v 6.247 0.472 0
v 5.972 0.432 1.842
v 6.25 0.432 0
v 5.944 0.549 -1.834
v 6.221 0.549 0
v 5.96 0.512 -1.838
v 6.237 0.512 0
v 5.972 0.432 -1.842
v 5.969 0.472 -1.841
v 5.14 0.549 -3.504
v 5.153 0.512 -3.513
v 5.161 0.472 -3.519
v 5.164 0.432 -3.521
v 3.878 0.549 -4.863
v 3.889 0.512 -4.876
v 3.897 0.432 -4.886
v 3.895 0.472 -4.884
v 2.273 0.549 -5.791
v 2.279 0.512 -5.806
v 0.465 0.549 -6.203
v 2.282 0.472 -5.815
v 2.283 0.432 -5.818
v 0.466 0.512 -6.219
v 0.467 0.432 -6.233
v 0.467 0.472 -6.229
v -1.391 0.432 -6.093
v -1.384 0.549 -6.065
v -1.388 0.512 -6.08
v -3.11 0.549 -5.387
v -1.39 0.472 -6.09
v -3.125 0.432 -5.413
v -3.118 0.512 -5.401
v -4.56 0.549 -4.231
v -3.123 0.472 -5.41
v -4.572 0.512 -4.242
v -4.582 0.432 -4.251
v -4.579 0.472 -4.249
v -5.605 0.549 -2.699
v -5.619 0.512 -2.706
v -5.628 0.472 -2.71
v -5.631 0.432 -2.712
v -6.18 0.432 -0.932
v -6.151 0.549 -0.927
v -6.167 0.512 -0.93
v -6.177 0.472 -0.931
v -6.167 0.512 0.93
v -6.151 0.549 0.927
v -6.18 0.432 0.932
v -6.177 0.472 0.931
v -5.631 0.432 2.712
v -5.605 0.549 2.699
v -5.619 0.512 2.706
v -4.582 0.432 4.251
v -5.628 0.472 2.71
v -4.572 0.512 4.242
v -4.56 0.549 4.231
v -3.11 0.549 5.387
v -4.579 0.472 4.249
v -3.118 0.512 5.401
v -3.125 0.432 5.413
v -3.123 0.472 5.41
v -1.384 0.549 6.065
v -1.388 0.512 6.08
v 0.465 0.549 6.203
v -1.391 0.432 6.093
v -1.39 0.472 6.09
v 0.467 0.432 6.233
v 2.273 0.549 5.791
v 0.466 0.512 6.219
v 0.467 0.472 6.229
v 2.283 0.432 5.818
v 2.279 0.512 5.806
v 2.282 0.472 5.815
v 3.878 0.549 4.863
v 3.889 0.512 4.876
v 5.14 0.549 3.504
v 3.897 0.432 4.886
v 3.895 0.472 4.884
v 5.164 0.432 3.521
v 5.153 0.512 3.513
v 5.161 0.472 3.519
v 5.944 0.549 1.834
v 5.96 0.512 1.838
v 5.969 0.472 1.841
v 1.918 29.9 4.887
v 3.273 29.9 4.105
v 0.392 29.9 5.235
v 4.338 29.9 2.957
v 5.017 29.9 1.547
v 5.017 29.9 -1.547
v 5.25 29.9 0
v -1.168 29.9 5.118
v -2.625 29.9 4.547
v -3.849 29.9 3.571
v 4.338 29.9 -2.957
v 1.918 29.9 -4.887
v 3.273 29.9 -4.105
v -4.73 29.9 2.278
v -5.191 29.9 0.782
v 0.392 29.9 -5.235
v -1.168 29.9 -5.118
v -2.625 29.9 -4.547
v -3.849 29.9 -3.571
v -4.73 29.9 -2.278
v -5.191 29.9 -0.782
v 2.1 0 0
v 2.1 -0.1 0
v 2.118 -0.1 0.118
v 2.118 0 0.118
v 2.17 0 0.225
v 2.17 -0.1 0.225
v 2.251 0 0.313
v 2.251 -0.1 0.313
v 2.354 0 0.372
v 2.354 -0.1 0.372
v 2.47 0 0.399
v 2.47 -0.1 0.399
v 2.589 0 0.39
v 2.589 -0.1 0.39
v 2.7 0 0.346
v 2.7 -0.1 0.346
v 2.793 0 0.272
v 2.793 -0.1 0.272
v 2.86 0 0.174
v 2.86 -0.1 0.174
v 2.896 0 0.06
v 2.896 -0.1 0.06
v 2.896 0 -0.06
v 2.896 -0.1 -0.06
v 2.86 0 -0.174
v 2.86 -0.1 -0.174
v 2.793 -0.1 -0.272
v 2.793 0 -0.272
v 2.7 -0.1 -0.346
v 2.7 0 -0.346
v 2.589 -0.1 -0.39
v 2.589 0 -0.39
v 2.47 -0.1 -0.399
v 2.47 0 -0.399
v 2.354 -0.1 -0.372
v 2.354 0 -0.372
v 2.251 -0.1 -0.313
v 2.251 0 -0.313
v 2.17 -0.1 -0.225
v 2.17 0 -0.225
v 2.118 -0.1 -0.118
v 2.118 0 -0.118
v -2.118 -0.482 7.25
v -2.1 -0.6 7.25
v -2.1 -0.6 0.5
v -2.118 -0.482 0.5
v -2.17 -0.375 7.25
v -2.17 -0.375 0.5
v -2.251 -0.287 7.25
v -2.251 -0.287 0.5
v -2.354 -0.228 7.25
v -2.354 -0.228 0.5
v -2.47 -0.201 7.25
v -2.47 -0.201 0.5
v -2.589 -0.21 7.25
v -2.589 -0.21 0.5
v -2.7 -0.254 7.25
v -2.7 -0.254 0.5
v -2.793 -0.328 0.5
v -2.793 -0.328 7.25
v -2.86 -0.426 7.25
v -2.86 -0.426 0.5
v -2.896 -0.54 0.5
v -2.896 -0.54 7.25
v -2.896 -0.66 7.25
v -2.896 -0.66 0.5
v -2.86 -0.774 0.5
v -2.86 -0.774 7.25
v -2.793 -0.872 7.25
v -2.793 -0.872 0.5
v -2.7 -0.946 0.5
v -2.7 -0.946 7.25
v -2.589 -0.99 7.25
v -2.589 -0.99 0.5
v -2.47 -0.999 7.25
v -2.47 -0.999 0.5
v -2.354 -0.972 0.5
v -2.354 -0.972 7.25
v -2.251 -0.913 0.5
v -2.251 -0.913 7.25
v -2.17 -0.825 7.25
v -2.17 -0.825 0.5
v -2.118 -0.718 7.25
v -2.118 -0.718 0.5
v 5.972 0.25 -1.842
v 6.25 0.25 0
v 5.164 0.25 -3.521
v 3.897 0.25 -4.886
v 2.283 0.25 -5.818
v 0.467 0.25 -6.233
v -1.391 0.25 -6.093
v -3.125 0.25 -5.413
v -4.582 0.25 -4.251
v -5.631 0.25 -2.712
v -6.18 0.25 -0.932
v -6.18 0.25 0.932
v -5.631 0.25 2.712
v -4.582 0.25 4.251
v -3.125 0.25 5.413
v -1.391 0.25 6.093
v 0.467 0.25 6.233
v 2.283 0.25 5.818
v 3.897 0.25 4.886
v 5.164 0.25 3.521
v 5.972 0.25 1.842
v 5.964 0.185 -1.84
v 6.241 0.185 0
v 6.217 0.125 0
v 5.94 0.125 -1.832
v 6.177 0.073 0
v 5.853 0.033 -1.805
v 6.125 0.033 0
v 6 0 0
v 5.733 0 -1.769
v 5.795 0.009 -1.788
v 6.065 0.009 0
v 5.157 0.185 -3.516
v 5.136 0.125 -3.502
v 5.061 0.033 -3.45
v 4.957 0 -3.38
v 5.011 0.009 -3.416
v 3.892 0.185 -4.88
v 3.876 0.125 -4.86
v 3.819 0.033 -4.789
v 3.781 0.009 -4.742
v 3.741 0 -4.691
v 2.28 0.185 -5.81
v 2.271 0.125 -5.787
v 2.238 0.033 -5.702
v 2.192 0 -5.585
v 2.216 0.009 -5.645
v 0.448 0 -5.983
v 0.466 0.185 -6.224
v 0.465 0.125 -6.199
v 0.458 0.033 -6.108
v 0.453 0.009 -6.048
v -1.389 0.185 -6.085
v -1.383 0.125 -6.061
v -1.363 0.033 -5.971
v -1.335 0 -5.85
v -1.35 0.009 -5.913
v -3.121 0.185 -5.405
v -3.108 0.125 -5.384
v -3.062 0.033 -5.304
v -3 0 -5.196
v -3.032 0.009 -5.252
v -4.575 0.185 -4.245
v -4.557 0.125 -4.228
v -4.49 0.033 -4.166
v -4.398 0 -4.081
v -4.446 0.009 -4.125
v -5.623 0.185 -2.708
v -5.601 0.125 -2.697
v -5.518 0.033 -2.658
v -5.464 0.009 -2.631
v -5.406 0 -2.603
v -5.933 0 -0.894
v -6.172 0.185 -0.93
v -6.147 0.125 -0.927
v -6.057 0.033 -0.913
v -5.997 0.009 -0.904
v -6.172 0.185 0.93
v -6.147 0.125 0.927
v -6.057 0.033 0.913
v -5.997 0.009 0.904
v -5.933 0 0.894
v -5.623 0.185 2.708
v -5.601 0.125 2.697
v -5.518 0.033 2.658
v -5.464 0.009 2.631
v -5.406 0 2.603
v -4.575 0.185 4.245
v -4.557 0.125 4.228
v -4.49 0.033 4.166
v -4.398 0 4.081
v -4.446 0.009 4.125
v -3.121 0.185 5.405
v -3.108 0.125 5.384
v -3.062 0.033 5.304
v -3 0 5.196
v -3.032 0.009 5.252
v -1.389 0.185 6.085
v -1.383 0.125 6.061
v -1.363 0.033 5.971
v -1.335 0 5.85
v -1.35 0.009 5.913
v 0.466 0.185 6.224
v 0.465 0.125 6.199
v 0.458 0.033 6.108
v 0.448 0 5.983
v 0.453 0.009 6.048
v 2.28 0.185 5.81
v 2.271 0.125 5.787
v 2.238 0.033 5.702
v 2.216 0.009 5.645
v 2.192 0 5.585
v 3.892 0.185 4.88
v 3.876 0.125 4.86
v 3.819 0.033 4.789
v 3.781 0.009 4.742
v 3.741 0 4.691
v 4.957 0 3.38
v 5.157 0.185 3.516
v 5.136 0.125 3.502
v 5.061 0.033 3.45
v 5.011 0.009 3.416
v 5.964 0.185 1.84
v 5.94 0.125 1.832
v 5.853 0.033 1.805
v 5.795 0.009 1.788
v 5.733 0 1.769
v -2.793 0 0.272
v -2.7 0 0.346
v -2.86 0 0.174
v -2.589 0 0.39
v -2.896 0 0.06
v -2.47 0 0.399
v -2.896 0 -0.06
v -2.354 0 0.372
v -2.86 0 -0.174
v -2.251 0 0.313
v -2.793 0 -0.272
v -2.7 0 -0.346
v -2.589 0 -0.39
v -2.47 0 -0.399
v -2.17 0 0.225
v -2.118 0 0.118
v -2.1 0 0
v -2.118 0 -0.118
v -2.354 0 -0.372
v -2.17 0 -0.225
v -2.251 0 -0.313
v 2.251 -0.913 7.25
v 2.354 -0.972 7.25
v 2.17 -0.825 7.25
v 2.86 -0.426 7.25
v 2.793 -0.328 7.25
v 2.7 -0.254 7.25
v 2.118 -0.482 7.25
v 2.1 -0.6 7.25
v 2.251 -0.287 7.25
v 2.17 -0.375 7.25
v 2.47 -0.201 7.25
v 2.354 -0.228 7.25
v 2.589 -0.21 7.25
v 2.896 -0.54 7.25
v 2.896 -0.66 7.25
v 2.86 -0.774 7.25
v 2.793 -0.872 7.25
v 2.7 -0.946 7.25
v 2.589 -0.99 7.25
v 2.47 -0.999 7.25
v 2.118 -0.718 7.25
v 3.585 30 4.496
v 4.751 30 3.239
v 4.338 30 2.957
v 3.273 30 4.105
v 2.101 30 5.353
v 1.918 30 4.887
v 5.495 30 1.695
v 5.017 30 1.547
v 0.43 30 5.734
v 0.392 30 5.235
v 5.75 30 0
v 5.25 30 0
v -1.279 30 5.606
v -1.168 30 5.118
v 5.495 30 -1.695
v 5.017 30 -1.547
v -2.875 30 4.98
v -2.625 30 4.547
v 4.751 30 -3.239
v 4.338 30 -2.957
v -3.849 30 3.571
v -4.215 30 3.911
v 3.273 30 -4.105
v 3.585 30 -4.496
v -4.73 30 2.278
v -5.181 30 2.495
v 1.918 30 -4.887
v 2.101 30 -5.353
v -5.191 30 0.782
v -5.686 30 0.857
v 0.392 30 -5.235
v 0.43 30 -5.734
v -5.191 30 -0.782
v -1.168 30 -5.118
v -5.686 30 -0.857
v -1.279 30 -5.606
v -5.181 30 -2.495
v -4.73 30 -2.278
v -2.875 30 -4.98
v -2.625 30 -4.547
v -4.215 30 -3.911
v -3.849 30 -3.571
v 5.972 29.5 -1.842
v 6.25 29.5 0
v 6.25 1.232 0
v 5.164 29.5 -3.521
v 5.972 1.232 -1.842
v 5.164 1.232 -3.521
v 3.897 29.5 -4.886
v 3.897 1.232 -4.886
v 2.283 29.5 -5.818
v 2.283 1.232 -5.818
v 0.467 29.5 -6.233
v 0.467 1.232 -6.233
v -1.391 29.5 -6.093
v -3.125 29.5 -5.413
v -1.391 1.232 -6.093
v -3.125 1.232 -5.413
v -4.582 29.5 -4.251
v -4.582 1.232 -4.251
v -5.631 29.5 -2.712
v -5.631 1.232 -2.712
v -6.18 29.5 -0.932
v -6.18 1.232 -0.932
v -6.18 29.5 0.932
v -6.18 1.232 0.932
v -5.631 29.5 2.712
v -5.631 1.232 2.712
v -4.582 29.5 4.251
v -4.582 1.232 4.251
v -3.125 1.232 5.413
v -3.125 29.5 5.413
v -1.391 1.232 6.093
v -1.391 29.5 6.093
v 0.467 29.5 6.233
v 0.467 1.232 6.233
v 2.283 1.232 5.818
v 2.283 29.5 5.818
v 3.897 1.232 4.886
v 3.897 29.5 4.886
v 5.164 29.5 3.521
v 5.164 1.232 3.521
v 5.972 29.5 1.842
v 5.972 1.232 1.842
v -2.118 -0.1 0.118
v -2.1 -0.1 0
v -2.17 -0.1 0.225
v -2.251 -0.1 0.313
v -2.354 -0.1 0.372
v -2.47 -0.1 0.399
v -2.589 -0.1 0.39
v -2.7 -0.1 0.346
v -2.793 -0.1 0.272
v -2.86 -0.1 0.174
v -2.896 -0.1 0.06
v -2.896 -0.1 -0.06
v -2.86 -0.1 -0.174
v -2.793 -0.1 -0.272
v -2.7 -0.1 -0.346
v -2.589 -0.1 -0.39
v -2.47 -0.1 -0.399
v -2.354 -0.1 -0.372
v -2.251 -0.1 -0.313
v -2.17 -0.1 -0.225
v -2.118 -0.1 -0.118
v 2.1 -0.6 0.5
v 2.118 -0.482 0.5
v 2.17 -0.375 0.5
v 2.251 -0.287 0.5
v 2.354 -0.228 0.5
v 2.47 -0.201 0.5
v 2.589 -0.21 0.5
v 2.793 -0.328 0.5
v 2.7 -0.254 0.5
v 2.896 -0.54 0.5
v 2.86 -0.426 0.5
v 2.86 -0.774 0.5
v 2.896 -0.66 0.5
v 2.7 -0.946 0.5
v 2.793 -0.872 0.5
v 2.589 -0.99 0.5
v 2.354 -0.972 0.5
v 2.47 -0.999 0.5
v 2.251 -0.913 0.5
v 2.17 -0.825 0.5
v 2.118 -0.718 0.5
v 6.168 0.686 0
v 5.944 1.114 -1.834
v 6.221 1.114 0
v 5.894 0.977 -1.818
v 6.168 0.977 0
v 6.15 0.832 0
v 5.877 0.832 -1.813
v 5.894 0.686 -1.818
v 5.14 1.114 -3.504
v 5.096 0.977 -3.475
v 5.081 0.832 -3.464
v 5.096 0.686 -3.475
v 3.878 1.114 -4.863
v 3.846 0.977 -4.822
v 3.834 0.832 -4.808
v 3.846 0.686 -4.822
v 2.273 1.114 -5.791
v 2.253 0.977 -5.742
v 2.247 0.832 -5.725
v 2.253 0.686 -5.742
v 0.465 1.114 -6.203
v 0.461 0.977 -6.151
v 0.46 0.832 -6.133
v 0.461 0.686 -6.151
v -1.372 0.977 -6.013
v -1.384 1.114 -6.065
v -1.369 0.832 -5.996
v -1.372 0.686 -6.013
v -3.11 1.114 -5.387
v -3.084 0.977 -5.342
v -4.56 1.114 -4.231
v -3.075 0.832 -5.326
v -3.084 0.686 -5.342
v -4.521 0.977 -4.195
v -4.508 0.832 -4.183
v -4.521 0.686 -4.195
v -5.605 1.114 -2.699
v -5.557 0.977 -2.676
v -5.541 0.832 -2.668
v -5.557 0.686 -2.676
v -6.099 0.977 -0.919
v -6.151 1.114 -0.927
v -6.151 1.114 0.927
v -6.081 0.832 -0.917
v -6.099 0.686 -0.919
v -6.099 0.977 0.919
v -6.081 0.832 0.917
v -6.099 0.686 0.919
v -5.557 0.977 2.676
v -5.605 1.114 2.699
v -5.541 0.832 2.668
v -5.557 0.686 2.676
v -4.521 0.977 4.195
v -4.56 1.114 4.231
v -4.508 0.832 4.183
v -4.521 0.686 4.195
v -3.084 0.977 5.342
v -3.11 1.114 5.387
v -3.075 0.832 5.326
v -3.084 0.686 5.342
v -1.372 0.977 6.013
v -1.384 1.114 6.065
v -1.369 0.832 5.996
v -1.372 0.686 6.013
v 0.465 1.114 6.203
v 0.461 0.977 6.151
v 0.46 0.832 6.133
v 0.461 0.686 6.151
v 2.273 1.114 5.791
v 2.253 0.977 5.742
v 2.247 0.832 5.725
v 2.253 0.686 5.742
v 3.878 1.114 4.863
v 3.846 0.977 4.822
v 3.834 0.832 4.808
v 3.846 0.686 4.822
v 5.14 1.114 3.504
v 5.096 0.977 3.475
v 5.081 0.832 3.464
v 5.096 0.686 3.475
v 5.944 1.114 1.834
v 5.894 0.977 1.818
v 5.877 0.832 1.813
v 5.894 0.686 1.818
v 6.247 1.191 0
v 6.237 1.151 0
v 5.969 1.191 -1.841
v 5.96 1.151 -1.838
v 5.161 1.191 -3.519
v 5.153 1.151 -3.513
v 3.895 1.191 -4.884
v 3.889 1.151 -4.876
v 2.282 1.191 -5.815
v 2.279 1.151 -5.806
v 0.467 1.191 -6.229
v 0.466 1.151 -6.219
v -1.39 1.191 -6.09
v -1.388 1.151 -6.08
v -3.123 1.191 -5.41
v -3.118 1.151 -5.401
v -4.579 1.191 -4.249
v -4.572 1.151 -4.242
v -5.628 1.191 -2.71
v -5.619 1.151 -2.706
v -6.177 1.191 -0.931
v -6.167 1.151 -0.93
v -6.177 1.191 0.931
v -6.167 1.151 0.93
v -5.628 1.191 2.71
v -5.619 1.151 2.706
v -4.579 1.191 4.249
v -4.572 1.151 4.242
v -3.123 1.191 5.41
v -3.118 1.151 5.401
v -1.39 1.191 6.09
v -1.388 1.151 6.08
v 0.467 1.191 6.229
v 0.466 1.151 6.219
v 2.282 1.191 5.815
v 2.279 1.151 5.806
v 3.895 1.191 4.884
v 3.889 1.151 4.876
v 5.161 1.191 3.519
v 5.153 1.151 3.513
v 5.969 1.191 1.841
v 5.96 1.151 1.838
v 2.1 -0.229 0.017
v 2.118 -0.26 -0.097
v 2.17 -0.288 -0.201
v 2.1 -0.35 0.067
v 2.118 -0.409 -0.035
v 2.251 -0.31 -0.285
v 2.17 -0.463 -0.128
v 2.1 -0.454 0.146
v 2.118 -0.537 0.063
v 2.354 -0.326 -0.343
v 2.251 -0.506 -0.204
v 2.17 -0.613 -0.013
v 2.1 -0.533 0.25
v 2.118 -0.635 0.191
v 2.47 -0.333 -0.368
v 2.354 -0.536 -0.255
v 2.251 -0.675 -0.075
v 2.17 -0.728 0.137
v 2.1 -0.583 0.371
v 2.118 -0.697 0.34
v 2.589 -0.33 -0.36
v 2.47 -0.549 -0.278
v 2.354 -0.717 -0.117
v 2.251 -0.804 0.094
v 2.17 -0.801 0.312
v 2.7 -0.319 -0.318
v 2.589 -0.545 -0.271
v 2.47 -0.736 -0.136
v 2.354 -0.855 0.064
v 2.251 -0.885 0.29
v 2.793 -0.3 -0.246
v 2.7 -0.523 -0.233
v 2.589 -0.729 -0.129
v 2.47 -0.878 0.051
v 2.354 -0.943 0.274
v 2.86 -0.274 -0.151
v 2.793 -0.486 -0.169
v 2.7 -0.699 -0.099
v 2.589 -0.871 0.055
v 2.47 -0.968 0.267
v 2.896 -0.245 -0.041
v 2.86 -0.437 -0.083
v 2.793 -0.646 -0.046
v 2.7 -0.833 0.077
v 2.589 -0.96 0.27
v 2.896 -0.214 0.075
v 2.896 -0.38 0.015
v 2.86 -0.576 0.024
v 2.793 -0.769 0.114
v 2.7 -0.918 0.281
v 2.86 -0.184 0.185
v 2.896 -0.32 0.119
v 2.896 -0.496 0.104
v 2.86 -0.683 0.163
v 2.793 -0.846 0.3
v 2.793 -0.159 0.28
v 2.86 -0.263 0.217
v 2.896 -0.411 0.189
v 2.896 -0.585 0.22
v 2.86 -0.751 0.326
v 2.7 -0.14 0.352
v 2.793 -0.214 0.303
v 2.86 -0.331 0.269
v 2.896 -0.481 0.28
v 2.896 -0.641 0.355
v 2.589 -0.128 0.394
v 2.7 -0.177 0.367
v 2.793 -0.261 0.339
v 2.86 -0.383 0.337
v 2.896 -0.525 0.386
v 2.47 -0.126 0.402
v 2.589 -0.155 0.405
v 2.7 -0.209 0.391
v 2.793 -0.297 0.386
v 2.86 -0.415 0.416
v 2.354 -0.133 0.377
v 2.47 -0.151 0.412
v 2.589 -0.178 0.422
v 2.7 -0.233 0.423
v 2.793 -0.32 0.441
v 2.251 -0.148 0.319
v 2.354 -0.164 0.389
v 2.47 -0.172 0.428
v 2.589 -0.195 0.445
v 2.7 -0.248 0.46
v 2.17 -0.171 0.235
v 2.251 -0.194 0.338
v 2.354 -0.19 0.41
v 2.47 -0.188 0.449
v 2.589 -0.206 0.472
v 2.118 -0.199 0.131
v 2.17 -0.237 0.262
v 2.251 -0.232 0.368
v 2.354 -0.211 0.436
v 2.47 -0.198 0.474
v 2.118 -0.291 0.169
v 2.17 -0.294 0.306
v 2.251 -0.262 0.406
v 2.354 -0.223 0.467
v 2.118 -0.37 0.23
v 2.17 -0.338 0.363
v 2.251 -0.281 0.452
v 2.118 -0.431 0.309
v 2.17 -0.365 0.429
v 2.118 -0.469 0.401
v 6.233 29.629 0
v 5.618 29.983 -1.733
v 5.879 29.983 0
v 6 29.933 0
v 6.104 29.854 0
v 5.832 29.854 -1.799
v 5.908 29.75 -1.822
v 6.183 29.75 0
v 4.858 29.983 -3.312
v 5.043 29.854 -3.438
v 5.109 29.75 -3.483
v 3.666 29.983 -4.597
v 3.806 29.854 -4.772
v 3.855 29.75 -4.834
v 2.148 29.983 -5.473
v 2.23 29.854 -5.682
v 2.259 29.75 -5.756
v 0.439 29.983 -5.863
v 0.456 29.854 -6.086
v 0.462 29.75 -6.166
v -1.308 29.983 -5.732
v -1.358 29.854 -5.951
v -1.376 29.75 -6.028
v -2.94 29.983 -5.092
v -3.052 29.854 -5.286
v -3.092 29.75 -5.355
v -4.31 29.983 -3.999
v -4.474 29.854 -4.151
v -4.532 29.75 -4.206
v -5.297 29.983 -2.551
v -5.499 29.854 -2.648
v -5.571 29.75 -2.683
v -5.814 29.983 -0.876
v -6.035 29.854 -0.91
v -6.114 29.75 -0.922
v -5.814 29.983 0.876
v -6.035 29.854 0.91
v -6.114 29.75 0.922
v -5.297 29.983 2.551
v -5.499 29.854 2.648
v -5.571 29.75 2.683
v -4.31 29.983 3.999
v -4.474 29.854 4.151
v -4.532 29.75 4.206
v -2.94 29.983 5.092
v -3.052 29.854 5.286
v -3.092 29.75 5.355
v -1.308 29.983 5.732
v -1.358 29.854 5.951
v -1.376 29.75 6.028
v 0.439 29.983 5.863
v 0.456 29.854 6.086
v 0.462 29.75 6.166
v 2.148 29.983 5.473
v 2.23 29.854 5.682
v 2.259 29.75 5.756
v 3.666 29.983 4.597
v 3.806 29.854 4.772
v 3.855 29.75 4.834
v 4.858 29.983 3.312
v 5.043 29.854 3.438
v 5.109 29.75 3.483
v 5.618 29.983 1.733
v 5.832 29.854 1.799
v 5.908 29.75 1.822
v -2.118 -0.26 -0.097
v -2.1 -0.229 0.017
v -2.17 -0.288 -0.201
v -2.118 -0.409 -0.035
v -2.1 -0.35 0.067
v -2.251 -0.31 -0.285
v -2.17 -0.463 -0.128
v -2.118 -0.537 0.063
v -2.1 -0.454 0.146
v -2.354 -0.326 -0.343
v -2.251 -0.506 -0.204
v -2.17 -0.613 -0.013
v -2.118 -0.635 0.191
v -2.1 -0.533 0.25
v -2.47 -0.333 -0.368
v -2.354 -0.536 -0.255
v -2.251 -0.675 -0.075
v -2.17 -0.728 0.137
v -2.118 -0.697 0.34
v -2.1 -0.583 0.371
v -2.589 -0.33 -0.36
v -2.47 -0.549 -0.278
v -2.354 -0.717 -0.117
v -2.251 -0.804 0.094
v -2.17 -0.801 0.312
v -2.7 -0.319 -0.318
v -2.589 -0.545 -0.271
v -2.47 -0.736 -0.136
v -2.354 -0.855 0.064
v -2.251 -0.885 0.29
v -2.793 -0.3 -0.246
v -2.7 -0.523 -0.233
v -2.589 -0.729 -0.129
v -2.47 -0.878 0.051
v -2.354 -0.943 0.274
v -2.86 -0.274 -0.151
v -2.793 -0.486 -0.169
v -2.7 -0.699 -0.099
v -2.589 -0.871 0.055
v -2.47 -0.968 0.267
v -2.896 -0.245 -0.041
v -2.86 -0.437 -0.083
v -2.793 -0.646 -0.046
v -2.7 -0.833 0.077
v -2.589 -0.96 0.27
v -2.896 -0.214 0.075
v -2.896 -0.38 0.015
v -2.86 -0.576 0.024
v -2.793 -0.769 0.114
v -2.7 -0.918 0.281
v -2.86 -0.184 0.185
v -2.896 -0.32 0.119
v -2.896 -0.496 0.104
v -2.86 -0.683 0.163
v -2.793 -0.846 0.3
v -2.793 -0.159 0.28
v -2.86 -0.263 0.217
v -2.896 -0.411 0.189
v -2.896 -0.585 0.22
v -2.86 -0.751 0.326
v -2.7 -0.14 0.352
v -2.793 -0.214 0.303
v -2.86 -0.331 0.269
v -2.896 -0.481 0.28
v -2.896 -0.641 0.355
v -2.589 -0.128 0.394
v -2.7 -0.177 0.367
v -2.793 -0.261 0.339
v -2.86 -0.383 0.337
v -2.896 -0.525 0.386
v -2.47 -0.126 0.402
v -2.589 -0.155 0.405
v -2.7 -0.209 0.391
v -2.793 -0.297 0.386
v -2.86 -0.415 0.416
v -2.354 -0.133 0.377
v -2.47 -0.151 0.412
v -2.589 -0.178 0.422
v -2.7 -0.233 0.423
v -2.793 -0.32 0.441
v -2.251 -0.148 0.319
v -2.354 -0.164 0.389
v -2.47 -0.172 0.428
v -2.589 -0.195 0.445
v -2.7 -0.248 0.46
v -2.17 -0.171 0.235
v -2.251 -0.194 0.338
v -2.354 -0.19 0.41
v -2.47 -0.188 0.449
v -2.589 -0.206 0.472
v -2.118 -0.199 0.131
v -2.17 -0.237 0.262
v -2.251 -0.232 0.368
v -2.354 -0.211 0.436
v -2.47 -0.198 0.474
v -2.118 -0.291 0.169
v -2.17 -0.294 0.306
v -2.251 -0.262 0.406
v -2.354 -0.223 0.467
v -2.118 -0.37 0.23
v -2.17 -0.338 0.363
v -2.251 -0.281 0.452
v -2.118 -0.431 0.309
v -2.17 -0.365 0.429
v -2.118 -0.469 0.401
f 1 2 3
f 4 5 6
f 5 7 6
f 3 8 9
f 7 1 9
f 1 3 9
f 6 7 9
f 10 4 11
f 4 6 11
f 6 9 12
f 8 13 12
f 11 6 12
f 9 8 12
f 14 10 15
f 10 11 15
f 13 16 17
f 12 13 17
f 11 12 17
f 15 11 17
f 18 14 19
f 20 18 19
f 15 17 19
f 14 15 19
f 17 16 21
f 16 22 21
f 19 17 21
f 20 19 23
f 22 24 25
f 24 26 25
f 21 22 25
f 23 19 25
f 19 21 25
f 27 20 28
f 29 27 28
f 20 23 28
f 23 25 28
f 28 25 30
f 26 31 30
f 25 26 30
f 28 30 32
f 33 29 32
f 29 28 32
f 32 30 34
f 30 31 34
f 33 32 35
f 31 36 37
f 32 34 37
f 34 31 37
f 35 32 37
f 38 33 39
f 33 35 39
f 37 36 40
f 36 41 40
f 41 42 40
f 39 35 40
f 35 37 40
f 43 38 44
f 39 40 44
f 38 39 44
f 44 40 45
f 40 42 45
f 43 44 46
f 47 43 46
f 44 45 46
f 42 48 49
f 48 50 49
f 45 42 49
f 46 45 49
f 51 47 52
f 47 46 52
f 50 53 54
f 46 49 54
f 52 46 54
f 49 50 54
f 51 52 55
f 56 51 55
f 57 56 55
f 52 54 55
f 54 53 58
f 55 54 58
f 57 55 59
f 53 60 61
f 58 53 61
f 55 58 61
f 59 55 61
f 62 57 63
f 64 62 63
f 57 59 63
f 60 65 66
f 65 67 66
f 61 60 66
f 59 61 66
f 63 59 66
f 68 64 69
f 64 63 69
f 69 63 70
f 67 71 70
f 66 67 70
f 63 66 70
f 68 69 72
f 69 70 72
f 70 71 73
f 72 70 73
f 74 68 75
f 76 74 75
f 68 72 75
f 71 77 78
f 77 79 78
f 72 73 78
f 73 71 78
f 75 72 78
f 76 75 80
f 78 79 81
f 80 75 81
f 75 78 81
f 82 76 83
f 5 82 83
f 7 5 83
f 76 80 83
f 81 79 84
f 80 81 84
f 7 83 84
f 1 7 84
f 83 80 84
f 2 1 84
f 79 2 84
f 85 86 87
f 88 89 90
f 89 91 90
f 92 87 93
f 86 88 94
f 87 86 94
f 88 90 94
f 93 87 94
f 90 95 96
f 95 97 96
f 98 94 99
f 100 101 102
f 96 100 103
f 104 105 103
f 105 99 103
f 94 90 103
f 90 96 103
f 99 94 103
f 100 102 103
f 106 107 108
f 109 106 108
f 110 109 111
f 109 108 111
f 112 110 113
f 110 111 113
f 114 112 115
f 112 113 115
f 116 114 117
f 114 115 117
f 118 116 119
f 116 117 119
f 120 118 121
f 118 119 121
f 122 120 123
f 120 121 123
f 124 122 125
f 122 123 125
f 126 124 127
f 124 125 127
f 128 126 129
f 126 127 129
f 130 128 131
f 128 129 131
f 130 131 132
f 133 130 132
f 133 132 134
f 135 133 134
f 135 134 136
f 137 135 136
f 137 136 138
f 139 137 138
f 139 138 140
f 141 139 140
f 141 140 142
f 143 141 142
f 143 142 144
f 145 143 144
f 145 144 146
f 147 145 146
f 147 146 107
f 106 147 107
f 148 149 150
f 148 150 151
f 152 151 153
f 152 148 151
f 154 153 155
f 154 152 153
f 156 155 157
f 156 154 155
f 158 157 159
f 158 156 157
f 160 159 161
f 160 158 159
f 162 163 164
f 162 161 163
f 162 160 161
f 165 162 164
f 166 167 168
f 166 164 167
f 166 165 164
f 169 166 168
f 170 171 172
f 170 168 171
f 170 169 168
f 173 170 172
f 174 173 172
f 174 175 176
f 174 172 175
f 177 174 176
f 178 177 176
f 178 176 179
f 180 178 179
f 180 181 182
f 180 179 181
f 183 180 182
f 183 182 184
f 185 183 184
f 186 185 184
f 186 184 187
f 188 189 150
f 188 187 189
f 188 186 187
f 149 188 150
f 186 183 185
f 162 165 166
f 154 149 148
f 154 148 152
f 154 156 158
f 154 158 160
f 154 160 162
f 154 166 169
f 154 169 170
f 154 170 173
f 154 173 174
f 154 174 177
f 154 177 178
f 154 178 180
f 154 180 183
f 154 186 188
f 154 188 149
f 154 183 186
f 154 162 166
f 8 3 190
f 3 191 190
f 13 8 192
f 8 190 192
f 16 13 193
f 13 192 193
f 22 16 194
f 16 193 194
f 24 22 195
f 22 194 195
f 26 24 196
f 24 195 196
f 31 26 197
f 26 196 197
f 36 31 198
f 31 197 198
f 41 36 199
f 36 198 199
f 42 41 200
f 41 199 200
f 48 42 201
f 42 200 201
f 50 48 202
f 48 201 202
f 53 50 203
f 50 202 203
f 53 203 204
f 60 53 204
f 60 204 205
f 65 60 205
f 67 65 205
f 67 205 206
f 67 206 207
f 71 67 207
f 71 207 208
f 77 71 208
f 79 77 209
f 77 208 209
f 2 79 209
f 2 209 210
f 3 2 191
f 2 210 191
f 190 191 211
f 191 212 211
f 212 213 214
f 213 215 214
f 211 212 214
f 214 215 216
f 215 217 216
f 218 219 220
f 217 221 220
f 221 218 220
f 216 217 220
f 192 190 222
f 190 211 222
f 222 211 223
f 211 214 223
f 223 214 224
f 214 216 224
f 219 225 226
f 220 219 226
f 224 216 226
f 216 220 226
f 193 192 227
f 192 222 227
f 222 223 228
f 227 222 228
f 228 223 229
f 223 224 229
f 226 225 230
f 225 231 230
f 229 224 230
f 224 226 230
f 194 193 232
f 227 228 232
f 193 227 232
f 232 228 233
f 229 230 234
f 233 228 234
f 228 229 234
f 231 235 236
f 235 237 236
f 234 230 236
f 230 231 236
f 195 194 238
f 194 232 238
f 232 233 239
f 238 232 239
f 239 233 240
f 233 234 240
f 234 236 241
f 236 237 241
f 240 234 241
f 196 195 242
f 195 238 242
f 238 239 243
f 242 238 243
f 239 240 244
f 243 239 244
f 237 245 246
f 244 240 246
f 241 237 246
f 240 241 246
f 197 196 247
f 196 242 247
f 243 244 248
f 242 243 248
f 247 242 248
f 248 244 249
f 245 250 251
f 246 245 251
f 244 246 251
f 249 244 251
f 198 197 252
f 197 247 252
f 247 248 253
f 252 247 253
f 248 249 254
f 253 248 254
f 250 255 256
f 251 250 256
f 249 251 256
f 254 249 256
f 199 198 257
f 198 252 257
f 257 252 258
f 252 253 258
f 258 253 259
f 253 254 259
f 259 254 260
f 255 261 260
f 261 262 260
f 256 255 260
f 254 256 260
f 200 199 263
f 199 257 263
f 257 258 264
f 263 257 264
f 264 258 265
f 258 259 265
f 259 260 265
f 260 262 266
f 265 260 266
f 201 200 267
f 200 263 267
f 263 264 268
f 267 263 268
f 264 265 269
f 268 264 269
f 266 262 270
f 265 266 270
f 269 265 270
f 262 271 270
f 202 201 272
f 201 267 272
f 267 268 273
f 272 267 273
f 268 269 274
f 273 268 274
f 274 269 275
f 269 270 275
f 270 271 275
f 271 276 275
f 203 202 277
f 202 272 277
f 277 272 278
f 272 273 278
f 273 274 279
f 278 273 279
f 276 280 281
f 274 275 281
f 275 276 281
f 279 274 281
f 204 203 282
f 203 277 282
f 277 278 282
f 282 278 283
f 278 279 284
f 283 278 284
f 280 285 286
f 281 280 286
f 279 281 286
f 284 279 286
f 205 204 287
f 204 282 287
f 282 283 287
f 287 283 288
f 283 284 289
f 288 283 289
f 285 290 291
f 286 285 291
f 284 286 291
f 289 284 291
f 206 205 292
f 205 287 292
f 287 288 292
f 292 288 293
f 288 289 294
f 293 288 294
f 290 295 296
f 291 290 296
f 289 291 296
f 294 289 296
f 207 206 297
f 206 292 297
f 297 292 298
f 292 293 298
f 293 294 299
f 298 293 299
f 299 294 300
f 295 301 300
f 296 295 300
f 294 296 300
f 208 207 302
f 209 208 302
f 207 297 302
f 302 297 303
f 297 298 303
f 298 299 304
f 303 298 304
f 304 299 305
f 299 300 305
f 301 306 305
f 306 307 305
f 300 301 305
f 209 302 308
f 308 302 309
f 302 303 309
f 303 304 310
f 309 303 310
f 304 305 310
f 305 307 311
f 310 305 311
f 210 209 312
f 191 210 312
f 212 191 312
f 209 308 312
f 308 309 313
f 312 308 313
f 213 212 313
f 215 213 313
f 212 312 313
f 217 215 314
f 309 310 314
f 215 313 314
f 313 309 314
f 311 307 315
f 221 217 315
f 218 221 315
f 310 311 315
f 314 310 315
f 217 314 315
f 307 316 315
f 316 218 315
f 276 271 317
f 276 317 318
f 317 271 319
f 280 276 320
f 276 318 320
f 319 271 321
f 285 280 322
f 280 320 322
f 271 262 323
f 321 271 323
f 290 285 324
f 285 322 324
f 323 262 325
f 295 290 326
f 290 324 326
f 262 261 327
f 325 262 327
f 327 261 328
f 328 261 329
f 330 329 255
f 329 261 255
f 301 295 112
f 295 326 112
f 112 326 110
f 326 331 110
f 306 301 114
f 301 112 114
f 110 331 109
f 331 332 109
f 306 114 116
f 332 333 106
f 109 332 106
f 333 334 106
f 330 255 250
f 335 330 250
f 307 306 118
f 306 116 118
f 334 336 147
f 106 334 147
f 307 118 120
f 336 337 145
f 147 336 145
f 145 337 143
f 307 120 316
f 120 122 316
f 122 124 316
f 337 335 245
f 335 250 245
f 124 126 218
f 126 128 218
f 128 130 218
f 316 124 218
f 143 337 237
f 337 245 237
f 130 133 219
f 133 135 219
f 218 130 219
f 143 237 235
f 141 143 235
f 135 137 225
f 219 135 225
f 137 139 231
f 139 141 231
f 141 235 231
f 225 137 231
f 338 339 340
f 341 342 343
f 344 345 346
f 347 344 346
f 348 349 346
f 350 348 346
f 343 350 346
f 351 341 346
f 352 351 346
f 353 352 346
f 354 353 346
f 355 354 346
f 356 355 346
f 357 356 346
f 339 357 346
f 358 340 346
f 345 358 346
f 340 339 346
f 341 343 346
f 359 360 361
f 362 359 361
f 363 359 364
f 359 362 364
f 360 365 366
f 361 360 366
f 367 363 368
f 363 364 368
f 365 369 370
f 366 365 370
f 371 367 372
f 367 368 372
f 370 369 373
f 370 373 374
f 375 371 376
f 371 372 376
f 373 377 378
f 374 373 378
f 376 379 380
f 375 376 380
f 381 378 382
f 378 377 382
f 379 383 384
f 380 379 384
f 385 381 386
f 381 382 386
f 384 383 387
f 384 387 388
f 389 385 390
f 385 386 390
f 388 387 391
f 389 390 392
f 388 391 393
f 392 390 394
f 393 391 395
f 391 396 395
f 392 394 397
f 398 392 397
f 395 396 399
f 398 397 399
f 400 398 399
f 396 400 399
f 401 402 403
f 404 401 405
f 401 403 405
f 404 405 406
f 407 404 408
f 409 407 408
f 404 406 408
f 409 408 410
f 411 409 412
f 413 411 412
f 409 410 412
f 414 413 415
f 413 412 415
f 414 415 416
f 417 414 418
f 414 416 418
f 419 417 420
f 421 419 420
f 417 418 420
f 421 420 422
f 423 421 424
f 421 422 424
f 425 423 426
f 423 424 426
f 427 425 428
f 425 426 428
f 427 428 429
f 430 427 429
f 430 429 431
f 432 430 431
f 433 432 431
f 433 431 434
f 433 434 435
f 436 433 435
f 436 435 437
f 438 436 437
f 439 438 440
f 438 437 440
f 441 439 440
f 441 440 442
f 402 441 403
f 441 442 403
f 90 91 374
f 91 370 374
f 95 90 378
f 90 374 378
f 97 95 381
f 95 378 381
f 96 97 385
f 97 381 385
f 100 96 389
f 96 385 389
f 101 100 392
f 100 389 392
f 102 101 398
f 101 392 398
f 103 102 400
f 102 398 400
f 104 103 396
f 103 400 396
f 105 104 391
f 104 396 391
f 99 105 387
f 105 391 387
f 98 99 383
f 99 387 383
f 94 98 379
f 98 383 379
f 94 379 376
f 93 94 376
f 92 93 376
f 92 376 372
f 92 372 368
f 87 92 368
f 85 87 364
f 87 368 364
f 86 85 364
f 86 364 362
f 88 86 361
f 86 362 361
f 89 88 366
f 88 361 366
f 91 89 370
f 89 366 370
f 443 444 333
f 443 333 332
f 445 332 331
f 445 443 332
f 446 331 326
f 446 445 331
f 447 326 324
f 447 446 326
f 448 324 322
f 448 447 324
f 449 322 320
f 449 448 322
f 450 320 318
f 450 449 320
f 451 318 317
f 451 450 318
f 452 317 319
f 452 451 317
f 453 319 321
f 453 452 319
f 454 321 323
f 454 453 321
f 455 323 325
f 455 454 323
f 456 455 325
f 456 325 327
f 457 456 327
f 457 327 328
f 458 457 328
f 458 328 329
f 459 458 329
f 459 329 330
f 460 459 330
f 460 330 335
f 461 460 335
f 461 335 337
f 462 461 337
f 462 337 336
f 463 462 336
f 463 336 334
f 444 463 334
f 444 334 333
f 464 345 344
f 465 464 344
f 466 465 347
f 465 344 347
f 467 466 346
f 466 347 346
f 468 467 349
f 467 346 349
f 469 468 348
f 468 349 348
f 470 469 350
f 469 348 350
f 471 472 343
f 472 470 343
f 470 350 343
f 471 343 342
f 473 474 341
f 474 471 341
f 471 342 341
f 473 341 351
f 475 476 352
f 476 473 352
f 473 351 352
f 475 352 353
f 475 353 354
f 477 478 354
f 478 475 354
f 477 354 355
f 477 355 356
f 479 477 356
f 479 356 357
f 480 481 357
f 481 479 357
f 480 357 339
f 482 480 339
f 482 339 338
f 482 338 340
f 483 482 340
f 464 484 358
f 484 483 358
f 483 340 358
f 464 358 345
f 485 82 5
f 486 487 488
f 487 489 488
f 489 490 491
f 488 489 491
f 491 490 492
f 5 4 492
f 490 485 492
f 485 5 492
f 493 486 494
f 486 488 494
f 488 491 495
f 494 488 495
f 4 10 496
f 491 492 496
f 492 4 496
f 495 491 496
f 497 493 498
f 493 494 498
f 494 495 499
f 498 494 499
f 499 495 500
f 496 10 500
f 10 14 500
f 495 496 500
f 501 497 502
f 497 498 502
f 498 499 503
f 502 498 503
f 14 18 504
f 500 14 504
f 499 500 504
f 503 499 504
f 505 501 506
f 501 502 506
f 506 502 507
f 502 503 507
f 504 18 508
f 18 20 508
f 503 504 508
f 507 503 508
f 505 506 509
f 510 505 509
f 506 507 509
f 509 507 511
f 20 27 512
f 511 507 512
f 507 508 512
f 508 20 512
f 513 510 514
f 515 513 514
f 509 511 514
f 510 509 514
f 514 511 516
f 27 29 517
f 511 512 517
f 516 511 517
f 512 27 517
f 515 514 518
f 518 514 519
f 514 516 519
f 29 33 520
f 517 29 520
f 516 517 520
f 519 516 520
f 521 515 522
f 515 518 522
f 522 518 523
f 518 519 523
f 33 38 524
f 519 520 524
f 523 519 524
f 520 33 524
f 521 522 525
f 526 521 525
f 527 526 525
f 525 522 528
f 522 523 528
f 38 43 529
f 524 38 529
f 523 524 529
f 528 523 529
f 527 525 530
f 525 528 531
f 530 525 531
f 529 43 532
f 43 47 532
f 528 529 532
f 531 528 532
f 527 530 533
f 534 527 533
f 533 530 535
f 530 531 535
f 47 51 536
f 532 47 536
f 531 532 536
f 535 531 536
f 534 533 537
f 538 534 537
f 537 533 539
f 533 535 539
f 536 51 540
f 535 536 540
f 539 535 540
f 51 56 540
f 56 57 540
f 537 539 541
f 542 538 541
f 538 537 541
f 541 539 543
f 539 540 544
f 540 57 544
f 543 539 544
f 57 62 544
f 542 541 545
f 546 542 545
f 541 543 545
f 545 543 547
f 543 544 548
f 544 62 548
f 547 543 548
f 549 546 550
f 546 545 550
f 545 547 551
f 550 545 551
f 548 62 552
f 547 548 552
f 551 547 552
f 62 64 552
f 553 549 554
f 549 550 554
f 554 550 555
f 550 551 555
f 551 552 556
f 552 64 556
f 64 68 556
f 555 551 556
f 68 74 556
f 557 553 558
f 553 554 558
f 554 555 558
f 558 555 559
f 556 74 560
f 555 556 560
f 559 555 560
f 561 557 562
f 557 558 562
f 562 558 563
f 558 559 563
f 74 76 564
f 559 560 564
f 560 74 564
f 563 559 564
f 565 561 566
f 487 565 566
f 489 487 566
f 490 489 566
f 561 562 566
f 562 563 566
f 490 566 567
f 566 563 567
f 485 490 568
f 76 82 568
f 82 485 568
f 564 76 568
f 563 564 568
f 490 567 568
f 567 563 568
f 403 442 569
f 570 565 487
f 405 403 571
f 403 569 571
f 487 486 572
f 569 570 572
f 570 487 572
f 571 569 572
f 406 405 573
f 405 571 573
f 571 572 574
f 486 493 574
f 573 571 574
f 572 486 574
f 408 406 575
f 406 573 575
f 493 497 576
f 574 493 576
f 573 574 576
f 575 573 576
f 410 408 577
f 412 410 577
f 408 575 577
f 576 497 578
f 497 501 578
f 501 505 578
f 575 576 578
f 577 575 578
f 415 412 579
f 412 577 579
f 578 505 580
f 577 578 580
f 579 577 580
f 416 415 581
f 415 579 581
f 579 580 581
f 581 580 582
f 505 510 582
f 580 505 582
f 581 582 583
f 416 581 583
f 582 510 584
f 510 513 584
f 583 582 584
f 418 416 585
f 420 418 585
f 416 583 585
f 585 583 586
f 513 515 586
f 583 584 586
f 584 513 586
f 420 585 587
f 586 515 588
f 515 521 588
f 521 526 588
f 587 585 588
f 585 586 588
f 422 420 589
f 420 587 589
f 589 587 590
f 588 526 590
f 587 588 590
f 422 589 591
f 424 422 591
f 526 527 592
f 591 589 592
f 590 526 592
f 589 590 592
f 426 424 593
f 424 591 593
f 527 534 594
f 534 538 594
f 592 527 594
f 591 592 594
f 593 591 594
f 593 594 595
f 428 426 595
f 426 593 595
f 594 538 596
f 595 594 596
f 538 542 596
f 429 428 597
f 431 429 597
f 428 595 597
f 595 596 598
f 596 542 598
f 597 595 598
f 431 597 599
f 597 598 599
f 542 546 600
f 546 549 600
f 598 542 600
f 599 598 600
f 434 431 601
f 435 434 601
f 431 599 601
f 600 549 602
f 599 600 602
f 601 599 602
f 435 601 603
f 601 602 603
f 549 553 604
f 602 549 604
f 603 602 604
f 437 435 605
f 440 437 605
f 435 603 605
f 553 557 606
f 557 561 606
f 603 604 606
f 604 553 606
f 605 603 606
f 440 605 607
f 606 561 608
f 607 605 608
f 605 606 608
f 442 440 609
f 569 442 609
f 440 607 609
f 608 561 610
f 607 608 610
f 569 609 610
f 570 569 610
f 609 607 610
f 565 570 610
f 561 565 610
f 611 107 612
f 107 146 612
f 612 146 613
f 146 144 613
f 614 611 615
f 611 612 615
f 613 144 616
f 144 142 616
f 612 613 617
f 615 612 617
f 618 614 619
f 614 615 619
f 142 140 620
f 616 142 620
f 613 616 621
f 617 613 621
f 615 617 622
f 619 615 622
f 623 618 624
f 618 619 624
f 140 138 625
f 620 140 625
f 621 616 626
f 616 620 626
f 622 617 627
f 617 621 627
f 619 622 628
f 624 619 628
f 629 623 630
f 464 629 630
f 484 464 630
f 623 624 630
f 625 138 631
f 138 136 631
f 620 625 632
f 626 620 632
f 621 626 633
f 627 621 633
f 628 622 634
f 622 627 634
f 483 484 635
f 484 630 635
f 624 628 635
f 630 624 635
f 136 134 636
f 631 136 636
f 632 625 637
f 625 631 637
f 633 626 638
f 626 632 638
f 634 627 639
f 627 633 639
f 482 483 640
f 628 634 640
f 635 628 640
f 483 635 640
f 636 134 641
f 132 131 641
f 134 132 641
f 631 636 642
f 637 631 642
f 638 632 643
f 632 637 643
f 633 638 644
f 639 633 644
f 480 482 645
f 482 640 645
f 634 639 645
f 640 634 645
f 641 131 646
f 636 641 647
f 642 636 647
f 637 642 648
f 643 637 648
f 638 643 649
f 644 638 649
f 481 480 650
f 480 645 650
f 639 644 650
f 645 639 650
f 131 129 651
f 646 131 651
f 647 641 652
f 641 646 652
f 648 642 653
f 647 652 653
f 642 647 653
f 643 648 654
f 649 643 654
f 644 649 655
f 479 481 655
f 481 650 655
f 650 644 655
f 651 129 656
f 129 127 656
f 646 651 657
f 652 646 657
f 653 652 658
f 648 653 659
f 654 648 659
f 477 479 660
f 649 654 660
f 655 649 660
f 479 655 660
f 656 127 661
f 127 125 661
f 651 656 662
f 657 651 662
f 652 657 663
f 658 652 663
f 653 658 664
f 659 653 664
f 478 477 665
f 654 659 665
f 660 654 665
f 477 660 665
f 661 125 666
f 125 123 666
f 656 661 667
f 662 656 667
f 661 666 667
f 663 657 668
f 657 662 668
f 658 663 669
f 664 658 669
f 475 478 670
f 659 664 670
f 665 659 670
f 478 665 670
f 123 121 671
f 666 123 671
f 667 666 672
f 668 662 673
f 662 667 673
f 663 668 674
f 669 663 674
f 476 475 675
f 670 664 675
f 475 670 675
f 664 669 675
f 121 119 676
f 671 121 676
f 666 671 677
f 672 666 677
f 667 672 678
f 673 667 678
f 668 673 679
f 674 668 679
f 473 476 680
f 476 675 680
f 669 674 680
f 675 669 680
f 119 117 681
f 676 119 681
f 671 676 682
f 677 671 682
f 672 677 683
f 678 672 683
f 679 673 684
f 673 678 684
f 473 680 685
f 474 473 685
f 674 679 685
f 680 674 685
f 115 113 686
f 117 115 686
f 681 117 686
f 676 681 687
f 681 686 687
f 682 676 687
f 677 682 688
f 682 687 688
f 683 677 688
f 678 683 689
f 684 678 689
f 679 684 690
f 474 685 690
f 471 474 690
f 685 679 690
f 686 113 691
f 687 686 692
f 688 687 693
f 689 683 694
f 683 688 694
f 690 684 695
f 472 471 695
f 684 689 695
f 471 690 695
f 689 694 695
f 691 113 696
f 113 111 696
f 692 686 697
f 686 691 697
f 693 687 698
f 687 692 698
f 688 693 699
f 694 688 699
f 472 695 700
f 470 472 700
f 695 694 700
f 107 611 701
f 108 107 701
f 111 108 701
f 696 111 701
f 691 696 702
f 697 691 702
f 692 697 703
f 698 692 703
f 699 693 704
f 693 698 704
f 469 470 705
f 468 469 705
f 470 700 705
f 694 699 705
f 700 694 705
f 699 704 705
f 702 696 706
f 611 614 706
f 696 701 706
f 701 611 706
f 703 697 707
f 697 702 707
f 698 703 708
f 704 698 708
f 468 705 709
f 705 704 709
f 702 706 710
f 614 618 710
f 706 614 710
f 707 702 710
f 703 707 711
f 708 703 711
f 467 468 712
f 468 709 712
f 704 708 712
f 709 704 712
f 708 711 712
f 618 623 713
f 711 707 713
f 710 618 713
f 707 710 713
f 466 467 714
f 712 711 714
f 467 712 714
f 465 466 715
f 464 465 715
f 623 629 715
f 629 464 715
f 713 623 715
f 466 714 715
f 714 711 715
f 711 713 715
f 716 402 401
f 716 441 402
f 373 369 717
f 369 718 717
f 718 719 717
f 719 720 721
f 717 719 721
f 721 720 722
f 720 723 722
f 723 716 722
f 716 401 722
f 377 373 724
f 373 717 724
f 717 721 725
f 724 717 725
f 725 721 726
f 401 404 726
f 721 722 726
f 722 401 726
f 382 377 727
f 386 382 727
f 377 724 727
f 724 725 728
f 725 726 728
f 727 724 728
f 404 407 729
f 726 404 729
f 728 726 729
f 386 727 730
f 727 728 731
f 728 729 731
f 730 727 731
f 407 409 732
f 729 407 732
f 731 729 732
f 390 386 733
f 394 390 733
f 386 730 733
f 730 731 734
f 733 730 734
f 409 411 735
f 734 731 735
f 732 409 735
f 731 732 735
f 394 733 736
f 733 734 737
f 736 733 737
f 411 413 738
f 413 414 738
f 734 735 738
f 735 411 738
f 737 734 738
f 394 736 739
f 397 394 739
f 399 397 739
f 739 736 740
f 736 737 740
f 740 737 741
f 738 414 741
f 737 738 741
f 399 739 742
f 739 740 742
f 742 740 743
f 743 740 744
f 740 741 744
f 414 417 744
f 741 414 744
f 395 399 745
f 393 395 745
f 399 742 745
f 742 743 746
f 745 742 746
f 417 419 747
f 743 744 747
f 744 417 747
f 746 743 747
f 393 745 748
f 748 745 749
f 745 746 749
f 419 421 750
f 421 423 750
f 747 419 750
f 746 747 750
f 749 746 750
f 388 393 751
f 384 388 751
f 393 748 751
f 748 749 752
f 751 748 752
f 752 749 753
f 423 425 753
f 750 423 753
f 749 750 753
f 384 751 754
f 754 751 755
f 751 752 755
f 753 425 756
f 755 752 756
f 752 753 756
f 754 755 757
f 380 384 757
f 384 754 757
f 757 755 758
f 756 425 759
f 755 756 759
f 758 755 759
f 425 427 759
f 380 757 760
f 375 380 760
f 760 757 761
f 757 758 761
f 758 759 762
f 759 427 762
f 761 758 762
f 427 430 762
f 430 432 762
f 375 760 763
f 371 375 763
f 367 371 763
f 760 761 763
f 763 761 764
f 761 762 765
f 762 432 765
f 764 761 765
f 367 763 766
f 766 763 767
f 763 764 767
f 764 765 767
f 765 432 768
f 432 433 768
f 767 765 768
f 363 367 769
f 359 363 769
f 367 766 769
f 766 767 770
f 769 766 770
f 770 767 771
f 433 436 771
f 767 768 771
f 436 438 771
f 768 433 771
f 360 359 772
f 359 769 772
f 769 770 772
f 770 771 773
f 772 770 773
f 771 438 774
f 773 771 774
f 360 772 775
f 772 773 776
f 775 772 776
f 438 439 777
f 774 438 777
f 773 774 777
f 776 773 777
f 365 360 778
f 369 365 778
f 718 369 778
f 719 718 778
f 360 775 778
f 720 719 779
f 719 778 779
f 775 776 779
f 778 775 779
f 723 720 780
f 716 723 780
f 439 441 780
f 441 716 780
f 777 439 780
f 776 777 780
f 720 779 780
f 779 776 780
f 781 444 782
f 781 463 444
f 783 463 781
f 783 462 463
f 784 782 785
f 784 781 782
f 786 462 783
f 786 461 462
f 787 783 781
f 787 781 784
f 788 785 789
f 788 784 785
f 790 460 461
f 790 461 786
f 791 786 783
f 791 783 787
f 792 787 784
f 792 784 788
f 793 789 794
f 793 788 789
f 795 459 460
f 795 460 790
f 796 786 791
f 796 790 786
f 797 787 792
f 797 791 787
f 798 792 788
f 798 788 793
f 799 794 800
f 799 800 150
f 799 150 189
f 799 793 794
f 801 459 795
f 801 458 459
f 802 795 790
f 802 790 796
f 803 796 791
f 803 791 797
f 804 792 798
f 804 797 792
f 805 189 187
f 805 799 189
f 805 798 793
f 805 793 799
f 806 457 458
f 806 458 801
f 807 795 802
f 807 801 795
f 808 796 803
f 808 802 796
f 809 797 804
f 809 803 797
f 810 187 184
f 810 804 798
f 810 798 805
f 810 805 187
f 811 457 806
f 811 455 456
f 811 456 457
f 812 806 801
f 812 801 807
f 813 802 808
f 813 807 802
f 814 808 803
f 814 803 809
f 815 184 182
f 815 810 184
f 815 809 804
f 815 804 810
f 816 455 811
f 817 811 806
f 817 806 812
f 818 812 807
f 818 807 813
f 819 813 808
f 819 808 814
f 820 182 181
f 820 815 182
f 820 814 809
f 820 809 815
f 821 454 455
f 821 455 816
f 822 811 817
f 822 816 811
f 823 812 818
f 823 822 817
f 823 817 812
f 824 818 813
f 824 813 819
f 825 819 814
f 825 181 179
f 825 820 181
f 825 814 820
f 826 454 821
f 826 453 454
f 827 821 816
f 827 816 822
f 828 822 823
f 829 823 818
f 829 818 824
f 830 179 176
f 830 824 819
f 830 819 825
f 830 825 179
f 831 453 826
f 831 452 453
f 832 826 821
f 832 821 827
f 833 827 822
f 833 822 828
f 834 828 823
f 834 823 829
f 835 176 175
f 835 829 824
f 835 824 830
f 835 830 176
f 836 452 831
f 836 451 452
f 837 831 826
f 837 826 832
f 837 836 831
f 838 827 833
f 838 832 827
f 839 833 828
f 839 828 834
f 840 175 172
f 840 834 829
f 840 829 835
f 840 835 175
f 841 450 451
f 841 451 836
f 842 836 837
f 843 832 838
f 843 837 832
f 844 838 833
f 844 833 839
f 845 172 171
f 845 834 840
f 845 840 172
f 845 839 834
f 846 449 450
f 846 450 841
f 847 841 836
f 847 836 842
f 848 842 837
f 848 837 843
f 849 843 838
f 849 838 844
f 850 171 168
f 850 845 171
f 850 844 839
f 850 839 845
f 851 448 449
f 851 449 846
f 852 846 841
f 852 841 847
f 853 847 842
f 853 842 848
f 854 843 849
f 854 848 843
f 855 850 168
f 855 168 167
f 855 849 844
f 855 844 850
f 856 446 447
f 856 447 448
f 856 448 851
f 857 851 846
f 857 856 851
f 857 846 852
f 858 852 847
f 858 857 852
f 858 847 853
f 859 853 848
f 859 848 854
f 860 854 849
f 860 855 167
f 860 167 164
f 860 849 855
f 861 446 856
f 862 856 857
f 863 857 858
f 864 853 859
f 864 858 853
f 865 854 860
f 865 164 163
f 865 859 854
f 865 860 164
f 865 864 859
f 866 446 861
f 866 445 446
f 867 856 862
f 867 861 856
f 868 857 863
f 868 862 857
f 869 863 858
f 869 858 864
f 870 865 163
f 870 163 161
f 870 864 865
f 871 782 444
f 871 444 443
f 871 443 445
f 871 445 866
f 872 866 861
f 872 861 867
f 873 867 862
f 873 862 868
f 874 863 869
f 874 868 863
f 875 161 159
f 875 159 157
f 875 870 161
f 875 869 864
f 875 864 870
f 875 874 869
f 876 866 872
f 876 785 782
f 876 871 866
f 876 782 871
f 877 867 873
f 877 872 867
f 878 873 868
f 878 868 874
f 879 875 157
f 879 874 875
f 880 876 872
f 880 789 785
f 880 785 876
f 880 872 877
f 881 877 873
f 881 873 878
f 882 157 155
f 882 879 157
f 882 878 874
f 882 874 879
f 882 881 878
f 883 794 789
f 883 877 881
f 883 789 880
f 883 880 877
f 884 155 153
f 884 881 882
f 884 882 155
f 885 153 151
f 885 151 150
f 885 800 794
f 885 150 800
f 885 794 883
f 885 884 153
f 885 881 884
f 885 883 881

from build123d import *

# Parameters (mm, degrees)
SKETCH4_R = 0.4


with BuildPart() as part:
    # Sketch1 → Revolve1 (revolve)
    with BuildSketch(Plane.XY):
        with BuildLine():
            Line((0, 29.9), (5.25, 29.9))
            Line((5.25, 29.9), (5.25, 30))
            Line((5.25, 30), (5.75, 30))
            ThreePointArc((5.75, 30), (6.103553391, 29.853553391), (6.25, 29.5))
            Line((6.25, 29.5), (6.25, 1.231662479))
            ThreePointArc((6.25, 1.231662479), (6.242535625, 1.171028573), (6.220588235, 1.11401542))
            ThreePointArc((6.220588235, 1.11401542), (6.15, 0.831662479), (6.220588235, 0.549309538))
            ThreePointArc((6.220588235, 0.549309538), (6.242535625, 0.492296385), (6.25, 0.431662479))
            Line((6.25, 0.431662479), (6.25, 0.25))
            ThreePointArc((6.25, 0.25), (6.176776695, 0.073223305), (6, 0))
            Line((6, 0), (0, 0))
            Line((0, 0), (0, 29.9))
        make_face()
    revolve(axis=Axis((0, 0, 0), (0, 1, 0)))

    # Sweep1: sweep along a path in Sketch5
    with BuildLine(Plane(origin=(-2.5, 0, 0), x_dir=(0, 0, -1), z_dir=(1, 0, 0))) as sweep1_path:
        Line((0, 0), (0, -0.1))
        ThreePointArc((0, -0.1), (-0.146446609, -0.453553391), (-0.5, -0.6))
        Line((-0.5, -0.6), (-7.25, -0.6))
    # Sketch4 → Sweep1 (sweep)
    with BuildSketch(Plane.XZ):
        with Locations((-2.5, 0)):
            Circle(SKETCH4_R)
    sweep1 = sweep(path=sweep1_path.line)

    # Mirror1: Sweep1 across plane
    add(sweep1.mirror(Plane(origin=(0, 0, 0), x_dir=(0, 0, 1), z_dir=(1, 0, 0))))


solid = part.part
